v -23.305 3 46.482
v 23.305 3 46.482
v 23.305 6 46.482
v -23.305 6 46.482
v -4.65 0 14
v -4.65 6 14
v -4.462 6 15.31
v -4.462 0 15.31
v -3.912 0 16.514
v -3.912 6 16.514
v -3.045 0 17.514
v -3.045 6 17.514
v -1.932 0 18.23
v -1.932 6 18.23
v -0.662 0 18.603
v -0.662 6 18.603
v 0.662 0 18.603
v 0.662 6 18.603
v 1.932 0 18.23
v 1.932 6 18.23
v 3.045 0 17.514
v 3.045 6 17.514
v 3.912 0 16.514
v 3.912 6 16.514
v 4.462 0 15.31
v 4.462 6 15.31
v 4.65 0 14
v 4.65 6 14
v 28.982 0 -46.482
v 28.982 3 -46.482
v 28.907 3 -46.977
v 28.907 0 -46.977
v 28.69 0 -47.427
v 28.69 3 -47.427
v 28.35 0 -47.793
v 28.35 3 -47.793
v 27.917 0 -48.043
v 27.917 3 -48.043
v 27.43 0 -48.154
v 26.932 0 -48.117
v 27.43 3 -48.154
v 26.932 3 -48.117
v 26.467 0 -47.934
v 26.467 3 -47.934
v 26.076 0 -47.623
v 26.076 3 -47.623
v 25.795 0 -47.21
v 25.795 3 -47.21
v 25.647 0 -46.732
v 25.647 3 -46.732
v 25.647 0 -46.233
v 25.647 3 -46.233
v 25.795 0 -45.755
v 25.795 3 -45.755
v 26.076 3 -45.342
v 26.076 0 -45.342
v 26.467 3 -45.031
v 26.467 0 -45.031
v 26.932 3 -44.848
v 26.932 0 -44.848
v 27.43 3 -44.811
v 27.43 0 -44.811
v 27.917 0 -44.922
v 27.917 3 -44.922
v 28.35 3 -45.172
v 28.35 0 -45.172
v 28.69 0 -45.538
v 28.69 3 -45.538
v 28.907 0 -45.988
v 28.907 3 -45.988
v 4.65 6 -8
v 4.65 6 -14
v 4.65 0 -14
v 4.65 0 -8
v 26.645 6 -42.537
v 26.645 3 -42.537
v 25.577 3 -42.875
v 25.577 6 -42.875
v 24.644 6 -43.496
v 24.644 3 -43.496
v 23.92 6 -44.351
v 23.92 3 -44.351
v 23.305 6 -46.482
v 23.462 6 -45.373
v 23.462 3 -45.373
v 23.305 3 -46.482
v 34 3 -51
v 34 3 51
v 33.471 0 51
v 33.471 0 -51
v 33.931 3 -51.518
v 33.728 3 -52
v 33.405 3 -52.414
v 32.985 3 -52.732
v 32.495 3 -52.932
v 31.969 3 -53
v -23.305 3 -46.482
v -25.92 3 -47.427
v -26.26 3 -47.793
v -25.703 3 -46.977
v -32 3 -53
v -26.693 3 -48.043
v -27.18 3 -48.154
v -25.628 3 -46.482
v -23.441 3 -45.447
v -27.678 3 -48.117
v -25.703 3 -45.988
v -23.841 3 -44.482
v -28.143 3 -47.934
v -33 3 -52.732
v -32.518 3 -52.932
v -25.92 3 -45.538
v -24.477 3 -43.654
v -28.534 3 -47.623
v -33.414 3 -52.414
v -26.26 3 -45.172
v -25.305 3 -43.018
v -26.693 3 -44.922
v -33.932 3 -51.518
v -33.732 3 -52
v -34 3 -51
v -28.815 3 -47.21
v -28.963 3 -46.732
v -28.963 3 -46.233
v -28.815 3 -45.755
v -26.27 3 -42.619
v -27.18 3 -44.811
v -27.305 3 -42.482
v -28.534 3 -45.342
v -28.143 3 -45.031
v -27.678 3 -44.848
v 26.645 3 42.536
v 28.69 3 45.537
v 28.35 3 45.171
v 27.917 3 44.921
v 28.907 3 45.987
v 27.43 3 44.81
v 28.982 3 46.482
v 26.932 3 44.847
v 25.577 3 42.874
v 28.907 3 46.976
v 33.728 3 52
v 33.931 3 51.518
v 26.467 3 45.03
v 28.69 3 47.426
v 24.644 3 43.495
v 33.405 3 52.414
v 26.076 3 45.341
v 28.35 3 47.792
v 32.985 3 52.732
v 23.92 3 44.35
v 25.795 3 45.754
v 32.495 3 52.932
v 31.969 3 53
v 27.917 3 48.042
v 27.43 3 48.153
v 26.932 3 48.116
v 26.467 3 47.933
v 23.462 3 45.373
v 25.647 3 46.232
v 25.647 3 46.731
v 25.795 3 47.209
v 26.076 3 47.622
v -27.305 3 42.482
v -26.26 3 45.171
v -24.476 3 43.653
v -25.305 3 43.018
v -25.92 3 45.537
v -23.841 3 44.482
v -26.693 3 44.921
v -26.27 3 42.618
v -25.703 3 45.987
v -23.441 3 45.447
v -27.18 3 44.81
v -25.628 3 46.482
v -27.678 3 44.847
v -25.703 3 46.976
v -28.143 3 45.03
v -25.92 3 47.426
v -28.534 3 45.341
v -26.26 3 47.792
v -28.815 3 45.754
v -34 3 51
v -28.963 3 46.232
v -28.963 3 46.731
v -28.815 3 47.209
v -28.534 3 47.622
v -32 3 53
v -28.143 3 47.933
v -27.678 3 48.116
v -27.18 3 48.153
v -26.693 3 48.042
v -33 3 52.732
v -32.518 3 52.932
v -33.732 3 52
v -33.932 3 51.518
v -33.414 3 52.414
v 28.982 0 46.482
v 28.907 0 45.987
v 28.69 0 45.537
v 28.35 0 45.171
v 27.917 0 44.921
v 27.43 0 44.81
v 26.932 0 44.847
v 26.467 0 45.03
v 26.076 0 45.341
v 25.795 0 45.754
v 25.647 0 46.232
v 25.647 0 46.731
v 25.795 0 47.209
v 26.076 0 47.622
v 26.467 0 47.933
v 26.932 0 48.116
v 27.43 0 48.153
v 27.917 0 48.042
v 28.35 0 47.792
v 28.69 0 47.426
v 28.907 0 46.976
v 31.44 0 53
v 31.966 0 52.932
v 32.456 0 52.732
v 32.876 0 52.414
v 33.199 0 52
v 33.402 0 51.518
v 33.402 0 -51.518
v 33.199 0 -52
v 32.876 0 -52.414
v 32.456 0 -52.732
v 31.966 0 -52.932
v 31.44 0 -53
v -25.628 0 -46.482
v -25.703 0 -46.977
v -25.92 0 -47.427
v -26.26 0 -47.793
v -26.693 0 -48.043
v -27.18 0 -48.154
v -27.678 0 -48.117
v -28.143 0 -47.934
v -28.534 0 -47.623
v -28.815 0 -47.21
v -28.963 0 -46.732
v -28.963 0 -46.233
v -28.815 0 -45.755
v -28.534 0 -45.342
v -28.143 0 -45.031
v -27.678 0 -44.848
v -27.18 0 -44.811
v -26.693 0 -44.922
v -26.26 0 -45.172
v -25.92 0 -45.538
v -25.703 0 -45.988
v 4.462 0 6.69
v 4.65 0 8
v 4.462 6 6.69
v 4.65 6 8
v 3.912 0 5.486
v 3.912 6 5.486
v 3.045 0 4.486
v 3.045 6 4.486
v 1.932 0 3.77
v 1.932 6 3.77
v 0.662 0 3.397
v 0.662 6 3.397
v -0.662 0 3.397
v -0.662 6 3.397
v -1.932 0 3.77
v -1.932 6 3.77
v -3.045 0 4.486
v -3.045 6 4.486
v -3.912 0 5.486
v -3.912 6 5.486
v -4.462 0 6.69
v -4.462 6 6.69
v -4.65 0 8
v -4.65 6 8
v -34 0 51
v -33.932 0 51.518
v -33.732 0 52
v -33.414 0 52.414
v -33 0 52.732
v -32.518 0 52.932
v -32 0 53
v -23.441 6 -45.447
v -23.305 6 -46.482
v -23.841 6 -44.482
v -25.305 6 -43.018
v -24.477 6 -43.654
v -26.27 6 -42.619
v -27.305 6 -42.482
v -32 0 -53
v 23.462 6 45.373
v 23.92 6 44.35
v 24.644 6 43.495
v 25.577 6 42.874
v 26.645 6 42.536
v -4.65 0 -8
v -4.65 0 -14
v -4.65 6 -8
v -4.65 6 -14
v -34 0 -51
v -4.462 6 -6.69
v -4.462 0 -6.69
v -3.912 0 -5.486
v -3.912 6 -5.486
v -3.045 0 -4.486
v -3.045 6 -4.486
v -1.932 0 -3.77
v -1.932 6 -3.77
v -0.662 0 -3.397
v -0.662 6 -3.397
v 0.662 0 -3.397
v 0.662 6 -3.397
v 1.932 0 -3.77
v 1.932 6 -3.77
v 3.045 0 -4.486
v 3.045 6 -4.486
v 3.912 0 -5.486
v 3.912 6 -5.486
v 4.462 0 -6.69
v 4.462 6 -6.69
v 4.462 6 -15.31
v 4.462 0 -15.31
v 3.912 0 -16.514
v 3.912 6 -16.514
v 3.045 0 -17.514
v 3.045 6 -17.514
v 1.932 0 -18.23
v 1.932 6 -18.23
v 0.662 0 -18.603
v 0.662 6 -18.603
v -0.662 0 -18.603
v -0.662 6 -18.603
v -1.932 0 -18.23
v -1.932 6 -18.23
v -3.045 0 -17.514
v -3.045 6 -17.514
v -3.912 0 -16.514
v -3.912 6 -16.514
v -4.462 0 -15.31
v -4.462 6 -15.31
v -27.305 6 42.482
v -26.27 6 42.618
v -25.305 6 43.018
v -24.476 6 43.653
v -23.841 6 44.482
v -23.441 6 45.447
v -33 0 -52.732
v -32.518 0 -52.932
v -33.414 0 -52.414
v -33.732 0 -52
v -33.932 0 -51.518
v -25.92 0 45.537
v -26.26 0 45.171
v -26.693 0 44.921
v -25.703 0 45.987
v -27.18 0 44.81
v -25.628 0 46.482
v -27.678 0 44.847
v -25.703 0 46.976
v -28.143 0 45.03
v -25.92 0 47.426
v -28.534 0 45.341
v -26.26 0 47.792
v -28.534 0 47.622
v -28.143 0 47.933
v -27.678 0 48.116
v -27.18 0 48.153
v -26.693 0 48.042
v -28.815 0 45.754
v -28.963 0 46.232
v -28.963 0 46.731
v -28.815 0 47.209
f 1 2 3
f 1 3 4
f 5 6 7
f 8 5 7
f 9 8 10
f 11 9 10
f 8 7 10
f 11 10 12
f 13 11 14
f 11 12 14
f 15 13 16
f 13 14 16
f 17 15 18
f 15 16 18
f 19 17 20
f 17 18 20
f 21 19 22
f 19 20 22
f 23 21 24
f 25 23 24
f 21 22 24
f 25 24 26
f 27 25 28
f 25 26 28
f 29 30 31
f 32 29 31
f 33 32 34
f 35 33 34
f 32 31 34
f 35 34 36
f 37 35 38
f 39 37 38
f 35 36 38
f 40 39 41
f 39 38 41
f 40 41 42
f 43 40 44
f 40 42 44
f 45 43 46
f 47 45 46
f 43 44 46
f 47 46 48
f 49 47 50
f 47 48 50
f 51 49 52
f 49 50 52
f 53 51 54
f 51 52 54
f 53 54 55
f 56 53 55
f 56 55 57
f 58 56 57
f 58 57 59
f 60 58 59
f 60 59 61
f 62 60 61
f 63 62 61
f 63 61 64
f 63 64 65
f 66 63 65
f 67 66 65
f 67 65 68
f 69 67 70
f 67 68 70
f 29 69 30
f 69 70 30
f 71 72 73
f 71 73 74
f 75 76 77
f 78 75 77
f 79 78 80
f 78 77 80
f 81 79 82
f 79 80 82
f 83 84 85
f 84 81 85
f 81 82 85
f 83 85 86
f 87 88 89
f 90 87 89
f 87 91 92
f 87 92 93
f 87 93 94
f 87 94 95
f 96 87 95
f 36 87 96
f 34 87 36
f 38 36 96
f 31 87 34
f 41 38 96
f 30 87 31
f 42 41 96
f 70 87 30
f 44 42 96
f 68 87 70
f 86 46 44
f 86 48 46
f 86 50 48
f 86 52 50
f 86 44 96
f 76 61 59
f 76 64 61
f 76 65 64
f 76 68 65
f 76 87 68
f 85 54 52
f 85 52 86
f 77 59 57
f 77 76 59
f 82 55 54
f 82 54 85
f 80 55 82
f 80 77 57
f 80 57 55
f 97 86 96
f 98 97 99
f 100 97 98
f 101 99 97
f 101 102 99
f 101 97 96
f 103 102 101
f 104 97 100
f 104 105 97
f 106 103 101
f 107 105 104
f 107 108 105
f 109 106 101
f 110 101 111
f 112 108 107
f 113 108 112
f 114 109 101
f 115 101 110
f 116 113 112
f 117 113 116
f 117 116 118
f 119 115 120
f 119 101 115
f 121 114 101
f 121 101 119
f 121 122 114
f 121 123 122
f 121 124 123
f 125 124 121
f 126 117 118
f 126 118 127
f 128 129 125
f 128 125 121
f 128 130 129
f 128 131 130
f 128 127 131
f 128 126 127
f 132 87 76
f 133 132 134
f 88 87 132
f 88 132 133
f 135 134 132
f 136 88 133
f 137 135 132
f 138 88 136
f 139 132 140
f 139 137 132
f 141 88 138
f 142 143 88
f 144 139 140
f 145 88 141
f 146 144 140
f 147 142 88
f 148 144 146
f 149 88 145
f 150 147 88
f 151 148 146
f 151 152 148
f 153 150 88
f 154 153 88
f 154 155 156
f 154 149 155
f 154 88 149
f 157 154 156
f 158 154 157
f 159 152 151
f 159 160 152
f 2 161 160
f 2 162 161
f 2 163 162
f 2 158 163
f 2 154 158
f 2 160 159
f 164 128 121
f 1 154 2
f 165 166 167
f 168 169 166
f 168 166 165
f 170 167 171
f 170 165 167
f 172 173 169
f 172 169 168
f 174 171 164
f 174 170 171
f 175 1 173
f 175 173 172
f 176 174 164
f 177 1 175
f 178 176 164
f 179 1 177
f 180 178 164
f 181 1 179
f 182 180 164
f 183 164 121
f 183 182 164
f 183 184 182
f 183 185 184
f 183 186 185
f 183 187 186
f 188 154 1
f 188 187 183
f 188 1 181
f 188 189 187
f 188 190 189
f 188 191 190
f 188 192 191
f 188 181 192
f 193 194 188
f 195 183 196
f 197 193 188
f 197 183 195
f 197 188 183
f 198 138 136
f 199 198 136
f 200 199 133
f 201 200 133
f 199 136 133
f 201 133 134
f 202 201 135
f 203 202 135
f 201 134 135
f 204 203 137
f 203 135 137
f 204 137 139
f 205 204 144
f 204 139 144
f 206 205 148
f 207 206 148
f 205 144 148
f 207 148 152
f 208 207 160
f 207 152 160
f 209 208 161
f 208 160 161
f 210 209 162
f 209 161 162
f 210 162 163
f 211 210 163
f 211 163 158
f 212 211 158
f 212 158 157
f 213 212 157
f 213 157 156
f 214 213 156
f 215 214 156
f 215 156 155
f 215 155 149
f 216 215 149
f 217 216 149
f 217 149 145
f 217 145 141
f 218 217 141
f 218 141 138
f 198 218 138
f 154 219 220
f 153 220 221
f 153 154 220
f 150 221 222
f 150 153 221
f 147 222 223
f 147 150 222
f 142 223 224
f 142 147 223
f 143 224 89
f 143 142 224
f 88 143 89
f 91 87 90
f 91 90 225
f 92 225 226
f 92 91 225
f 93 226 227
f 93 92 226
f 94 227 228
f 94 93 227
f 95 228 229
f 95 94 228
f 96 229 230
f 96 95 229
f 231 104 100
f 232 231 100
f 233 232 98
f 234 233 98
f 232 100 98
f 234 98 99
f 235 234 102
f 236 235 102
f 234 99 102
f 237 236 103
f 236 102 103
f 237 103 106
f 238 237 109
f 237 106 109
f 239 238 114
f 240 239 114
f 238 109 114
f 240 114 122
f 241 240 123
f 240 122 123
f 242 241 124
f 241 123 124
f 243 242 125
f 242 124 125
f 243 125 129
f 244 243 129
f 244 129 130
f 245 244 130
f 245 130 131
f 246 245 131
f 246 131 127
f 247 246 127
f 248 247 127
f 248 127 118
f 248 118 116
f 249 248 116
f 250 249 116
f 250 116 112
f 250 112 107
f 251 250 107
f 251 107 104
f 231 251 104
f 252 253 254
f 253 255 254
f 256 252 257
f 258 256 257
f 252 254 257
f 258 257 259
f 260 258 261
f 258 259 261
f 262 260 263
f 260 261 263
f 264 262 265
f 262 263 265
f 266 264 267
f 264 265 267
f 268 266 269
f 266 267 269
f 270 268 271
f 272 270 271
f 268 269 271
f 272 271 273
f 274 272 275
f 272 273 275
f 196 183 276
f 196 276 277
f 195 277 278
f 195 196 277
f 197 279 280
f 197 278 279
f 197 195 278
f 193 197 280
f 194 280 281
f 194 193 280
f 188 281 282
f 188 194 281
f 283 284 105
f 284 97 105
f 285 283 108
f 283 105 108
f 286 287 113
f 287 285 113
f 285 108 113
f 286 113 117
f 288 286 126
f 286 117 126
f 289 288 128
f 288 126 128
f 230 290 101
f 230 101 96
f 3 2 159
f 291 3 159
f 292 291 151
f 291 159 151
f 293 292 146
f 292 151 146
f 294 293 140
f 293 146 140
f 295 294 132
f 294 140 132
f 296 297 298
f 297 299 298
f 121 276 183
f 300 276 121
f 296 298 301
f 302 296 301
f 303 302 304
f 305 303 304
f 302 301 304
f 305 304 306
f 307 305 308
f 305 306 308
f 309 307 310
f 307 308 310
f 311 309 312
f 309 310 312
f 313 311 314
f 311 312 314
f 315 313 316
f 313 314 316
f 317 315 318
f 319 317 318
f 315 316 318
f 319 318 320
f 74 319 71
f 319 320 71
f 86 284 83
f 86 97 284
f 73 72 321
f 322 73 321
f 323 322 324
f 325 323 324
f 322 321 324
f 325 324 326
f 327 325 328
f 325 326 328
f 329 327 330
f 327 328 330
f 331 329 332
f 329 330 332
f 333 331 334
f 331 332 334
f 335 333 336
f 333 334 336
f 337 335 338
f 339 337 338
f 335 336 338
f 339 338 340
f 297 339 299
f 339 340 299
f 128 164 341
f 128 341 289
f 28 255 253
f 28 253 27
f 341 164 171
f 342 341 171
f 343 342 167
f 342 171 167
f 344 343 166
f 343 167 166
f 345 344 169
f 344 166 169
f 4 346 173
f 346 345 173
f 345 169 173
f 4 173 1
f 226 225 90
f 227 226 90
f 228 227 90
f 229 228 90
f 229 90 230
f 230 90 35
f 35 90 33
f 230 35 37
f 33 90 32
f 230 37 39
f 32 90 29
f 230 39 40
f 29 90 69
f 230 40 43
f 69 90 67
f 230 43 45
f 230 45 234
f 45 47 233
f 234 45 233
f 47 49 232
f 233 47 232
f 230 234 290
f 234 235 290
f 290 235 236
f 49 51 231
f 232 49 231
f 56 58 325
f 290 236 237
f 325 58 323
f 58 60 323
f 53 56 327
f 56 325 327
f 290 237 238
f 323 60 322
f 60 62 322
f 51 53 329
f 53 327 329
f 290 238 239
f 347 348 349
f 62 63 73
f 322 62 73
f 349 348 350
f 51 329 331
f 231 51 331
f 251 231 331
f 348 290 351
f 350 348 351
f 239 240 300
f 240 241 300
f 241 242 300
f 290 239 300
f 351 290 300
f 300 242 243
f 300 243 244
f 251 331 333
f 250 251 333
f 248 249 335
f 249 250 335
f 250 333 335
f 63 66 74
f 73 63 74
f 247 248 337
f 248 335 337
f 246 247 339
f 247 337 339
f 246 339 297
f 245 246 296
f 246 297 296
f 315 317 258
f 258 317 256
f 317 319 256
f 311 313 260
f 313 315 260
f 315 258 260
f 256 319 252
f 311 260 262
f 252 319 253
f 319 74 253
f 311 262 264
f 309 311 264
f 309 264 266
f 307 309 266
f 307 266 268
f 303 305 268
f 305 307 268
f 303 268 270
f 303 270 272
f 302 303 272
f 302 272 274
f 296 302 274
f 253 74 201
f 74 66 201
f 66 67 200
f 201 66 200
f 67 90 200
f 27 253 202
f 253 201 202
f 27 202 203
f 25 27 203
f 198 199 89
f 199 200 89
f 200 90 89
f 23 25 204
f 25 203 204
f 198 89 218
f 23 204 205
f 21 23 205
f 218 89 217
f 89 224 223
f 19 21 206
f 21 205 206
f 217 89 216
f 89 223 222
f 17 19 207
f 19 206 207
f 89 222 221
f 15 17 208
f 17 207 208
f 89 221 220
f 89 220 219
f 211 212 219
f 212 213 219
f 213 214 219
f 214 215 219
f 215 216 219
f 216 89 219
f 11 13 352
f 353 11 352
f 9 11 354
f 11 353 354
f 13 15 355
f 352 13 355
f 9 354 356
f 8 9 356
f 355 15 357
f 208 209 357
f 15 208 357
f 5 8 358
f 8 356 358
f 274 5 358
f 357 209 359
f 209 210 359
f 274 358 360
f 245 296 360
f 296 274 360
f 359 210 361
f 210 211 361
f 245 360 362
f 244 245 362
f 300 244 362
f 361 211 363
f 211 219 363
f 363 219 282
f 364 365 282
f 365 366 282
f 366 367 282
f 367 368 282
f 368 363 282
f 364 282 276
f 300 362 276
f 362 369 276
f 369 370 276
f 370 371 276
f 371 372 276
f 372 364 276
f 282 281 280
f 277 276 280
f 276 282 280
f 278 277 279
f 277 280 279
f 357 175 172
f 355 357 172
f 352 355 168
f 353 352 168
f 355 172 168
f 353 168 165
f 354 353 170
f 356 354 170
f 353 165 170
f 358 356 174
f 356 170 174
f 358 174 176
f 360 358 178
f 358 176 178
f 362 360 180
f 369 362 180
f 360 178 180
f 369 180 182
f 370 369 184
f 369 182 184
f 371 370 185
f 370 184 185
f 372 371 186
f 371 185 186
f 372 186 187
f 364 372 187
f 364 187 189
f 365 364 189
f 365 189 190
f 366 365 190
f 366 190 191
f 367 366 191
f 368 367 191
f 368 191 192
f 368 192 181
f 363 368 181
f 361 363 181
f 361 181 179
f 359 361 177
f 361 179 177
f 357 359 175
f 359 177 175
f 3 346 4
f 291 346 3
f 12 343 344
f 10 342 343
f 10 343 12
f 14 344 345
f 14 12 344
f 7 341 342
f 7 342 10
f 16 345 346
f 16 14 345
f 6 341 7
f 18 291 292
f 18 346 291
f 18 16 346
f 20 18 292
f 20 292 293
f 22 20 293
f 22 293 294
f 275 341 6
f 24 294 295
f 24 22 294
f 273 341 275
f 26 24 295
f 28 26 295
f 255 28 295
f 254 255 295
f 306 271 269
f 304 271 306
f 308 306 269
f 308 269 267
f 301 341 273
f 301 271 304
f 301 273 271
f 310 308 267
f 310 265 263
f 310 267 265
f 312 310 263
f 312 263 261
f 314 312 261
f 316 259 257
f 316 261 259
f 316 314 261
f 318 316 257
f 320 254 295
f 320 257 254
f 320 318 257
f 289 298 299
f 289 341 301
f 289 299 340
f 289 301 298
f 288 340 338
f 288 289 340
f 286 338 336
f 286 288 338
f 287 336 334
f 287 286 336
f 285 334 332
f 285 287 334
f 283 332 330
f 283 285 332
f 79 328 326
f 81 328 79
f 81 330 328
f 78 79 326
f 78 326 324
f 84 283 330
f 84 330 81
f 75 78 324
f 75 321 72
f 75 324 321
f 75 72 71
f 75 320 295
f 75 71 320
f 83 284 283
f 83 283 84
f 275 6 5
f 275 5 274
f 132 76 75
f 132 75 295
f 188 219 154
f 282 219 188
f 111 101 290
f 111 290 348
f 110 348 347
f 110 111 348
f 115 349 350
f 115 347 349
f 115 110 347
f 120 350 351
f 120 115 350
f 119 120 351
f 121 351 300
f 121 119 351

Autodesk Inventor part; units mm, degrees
ref_plane "YZ Plane" through (0, 0, 0) normal (1, 0, 0) x (0, 1, 0)
ref_plane "XZ Plane" through (0, 0, 0) normal (0, 1, 0) x (-1, 0, 0)
ref_plane "XY Plane" through (0, 0, 0) normal (0, 0, 1) x (1, 0, 0)
sketch "Esboço1" plane through (0, 0, 0) normal (0, 1, 0) x (-1, 0, 0)
  line L0 (-34, 53) -> (34, 53)
  line L1 (34, 53) -> (34, -53)
  line L2 (34, -53) -> (-34, -53)
  line L3 (-34, -53) -> (-34, 53)
  line L4 (-34, 53) -> (34, -53) construction
  line L5 (34, 53) -> (-34, -53) construction
  point P0 (0, 0)
  dimension "d0" = 68
  dimension "d1" = 106
extrude "Extrusão1" add sketch "Esboço1" along normal blind 3
sketch "Esboço4" plane through (0, 3, 0) normal (0, 1, 0) x (1, 0, 0)
  line L0 (29.972, -49.0345) -> (-29.972, -49.0345)
  line L1 (-29.972, -49.0345) -> (-29.972, 49.0345)
  line L2 (-29.972, 49.0345) -> (29.972, 49.0345)
  line L3 (29.972, 49.0345) -> (29.972, -49.0345)
  line L4 (29.972, -49.0345) -> (-29.972, 49.0345) construction
  line L5 (-29.972, -49.0345) -> (29.972, 49.0345) construction
  circle A0 centre (-27.305, -46.4815) radius 1.6765
  circle A1 centre (27.305, -46.4815) radius 1.6765
  circle A2 centre (-27.305, 46.4825) radius 1.6765
  circle A3 centre (27.305, 46.4825) radius 1.6765
  point P0 (0, 0)
  dimension "d11" = 59.944
  dimension "d12" = 98.069
  dimension "d13" = 3.353
  dimension "d14" = 2.667
  dimension "d15" = 2.553
  dimension "d18" = 54.61
  dimension "d21" = 92.964
extrude "Extrusão3" cut sketch "Esboço4" against normal blind 3 contours A0 | A1 | A2 | A3
sketch "Esboço5" plane through (0, 3, 0) normal (0, 1, 0) x (1, 0, 0)
  circle A0 centre (-27.305, -46.4815) radius 1.6765 projected
  arc A1 (-23.305, -46.4825) -> (-27.305, -42.4815) centre (-27.305, -46.4815) ccw
  circle A2 centre (27.305, -46.4815) radius 1.6765 projected
  arc A3 (26.645, -42.5363) -> (23.305, -46.4825) centre (27.305, -46.4815) ccw
  circle A4 centre (27.305, 46.4825) radius 1.6765 projected
  arc A5 (23.305, 46.4825) -> (26.645, 42.5373) centre (27.305, 46.4825) ccw
  circle A6 centre (-27.305, 46.4825) radius 1.6765 projected
  arc A7 (-27.305, 42.4825) -> (-23.305, 46.4825) centre (-27.305, 46.4825) ccw
  line L0 (26.645, 42.5373) -> (26.645, -42.5363)
  line L1 (27.1364, -46.1956) -> (-27.305, 46.4825) construction
  line L2 (-26.975, -46.4825) -> (26.975, 46.4825) construction
  line L3 (-27.305, -42.4815) -> (-27.305, 42.4825)
  line L4 (23.305, -46.4825) -> (-23.305, -46.4825)
  line L5 (-23.305, 46.4825) -> (23.305, 46.4825)
  point P0 (0, 0)
  dimension "d26" = 8
  dimension "d27" = 8
  dimension "d28" = 8
  dimension "d29" = 8
extrude "Extrusão4" add sketch "Esboço5" along normal blind 3 contours A1 L3 A7 L5 A5 L0 A3 L4
sketch "Esboço7" plane through (-34, 0, 53) normal (0, 0, 1) x (1, 0, 0)
  line L0 (68, 0) -> (68, 3) projected
  line L1 (68, 0) -> (68, 3)
  line L2 (68, 3) -> (67.4537, -0.098)
  line L3 (67.4537, -0.098) -> (68, -0.098)
  line L4 (68, 0) -> (0, 0) projected
  line L5 (68, -0.098) -> (68, 0)
  line L6 (68, 3) -> (0, 3) projected
  line L7 (68, 0) -> (68, 3)
  point P0 (34, 0)
  dimension "d36" = 10
extrude "Extrusão6" cut sketch "Esboço7" against normal blind 114
fillet "Arredondamento1" radius 2 4 edges at (-34, 1.5, 53) (33.7355, 1.5, 53) (-34, 1.5, -53) (33.7355, 1.5, -53)
sketch "Esboço8" plane through (0, 6, 0) normal (0, 1, 0) x (1, 0, 0)
  arc A0 (4.65, 14) -> (-4.65, 14) centre (0, 14) ccw
  arc A1 (-4.65, 8) -> (4.65, 8) centre (0, 8) ccw
  arc A2 (4.65, -8) -> (-4.65, -8) centre (0, -8) ccw
  arc A3 (-4.65, -14) -> (4.65, -14) centre (0, -14) ccw
  line L0 (4.65, 14) -> (4.65, 8)
  line L1 (-4.65, 14) -> (-4.65, 8)
  line L2 (4.65, -8) -> (4.65, -14)
  line L3 (-4.65, -14) -> (-4.65, -8)
  point P0 (0, 0)
  dimension "d40" = 9.3
  dimension "d41" = 9.3
  dimension "d42" = 9.3
  dimension "d43" = 9.3
  dimension "d44" = 6
  dimension "d45" = 6
  dimension "d46" = 8
  dimension "d47" = 8
extrude "Extrusão7" cut sketch "Esboço8" against normal blind 10
properties part number "tampa"
